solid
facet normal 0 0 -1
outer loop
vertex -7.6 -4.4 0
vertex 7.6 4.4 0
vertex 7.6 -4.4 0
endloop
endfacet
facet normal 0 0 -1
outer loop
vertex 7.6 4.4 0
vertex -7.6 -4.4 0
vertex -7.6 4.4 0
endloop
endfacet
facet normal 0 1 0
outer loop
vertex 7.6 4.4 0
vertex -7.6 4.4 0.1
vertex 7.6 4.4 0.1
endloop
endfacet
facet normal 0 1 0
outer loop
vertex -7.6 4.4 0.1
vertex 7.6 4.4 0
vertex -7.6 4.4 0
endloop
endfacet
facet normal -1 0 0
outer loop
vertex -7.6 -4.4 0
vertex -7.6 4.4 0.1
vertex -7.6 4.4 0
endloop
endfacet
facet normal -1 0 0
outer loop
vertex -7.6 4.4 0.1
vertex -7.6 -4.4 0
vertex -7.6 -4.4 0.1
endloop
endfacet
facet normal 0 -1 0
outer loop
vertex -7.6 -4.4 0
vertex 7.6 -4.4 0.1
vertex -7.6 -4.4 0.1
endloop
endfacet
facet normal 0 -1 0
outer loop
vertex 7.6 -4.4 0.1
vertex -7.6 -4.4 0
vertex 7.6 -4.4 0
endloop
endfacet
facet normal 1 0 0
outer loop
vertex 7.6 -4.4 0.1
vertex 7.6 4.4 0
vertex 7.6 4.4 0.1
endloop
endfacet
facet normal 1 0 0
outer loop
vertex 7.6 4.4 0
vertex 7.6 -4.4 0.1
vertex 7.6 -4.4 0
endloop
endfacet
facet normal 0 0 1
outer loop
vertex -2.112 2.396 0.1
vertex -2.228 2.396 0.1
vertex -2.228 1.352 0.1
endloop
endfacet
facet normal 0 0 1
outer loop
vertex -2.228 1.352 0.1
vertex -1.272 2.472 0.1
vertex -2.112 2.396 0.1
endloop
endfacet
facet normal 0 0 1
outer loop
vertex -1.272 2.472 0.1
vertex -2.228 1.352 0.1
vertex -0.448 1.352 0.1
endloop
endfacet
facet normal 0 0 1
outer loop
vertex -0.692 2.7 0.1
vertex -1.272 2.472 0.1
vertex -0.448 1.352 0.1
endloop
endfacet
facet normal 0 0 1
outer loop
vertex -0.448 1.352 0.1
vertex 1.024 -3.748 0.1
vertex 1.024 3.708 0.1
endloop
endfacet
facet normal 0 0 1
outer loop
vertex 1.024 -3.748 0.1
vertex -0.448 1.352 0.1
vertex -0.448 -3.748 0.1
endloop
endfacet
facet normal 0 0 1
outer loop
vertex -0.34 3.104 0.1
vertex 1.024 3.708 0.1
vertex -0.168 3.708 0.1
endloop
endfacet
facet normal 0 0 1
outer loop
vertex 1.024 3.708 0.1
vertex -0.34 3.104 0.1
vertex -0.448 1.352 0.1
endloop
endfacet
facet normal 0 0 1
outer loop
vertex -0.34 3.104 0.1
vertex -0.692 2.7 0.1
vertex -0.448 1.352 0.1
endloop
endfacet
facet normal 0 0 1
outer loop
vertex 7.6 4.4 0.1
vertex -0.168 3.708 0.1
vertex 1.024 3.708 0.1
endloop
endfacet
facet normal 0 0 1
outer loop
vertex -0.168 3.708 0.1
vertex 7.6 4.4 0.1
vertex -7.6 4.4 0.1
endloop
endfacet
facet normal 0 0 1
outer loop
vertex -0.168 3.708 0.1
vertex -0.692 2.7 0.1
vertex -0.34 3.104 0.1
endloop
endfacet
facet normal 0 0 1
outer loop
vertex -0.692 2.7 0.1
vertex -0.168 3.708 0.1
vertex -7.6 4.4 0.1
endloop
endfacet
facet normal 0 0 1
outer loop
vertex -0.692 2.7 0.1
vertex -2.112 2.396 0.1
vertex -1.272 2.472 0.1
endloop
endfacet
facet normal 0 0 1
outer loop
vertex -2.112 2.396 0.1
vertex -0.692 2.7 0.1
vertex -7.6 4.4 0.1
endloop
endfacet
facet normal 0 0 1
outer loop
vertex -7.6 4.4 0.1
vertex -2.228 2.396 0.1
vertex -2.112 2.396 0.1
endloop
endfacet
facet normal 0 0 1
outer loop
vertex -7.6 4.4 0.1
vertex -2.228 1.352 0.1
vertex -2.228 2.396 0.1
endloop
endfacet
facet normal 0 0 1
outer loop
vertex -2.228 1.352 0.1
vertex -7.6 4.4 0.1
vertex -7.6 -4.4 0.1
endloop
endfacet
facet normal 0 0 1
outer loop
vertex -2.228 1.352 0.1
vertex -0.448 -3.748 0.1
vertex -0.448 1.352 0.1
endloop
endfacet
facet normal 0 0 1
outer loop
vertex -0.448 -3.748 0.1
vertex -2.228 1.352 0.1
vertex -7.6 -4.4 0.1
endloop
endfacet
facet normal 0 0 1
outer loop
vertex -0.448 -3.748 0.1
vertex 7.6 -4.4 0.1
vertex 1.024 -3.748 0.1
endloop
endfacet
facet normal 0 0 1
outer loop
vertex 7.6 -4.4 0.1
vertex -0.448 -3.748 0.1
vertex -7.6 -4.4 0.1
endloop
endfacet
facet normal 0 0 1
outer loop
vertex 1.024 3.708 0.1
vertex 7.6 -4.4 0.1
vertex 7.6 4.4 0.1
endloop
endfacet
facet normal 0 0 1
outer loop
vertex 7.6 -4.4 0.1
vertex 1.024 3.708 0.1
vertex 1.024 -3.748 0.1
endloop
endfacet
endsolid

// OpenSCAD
// file: s/004452bs02.scad
use <../../lib.scad>
function ldraw_lib__s__004452bs02() = [
// 0 ~Sticker  1.1 x  1.9 with Number "1" - Background
// 0 Name: s\004452bs02.dat
// 0 Author: Takeshi Takahashi [RainbowDolphin]
// 0 !LDRAW_ORG Subpart UPDATE 2022-04
// 0 !LICENSE Licensed under CC BY 4.0 : see CAreadme.txt
// 
// 0 BFC CERTIFY CCW
  [0,"BFC","CERTIFY"],
  [0,"BFC","CCW"],
// 
// 0 !HISTORY 2022-07-18 [PTadmin] Official Update 2022-04
// 
// 
// 4 16 -19 -.25 11 -.42 -.25 9.27 2.56 -.25 9.27 19 -.25 11
  [4,16,-19,-.25,11,-.42,-.25,9.27,2.56,-.25,9.27,19,-.25,11],
// 4 16 -.85 -.25 7.76 -.42 -.25 9.27 -19 -.25 11 -1.73 -.25 6.75
  [4,16,-.85,-.25,7.76,-.42,-.25,9.27,-19,-.25,11,-1.73,-.25,6.75],
// 4 16 -3.18 -.25 6.18 -1.73 -.25 6.75 -19 -.25 11 -5.28 -.25 5.99
  [4,16,-3.18,-.25,6.18,-1.73,-.25,6.75,-19,-.25,11,-5.28,-.25,5.99],
// 3 16 -19 -.25 11 -5.57 -.25 5.99 -5.28 -.25 5.99
  [3,16,-19,-.25,11,-5.57,-.25,5.99,-5.28,-.25,5.99],
// 4 16 -5.57 -.25 3.38 -5.57 -.25 5.99 -19 -.25 11 -19 -.25 -11
  [4,16,-5.57,-.25,3.38,-5.57,-.25,5.99,-19,-.25,11,-19,-.25,-11],
// 4 16 -1.12 -.25 3.38 -5.57 -.25 3.38 -19 -.25 -11 -1.12 -.25 -9.37
  [4,16,-1.12,-.25,3.38,-5.57,-.25,3.38,-19,-.25,-11,-1.12,-.25,-9.37],
// 4 16 2.56 -.25 -9.37 -1.12 -.25 -9.37 -19 -.25 -11 19 -.25 -11
  [4,16,2.56,-.25,-9.37,-1.12,-.25,-9.37,-19,-.25,-11,19,-.25,-11],
// 4 16 2.56 -.25 9.27 2.56 -.25 -9.37 19 -.25 -11 19 -.25 11
  [4,16,2.56,-.25,9.27,2.56,-.25,-9.37,19,-.25,-11,19,-.25,11],
];
module ldraw_lib__s__004452bs02(step=0, col=false, unit=2/5, alt=false, line=0.2, solid=!$preview)
    makepoly(ldraw_lib__s__004452bs02(), step=step, col=col, unit=unit, alt=alt, line=line, solid=solid);
ldraw_lib__s__004452bs02(line=0.2);
// file: s/004452bs01.scad
use <../../lib.scad>
function ldraw_lib__s__004452bs01() = [
// 0 ~Sticker  1.1 x  1.9 with Number "1" - Type Face
// 0 Name: s\004452bs01.dat
// 0 Author: Takeshi Takahashi [RainbowDolphin]
// 0 !LDRAW_ORG Subpart UPDATE 2022-04
// 0 !LICENSE Licensed under CC BY 4.0 : see CAreadme.txt
// 
// 0 BFC CERTIFY CCW
  [0,"BFC","CERTIFY"],
  [0,"BFC","CCW"],
// 
// 0 !HISTORY 2022-07-18 [PTadmin] Official Update 2022-04
// 
// 
// 3 16 -5.28 -.25 5.99 -5.57 -.25 5.99 -5.57 -.25 3.38
  [3,16,-5.28,-.25,5.99,-5.57,-.25,5.99,-5.57,-.25,3.38],
// 4 16 -3.18 -.25 6.18 -5.28 -.25 5.99 -5.57 -.25 3.38 -1.12 -.25 3.38
  [4,16,-3.18,-.25,6.18,-5.28,-.25,5.99,-5.57,-.25,3.38,-1.12,-.25,3.38],
// 3 16 -1.73 -.25 6.75 -3.18 -.25 6.18 -1.12 -.25 3.38
  [3,16,-1.73,-.25,6.75,-3.18,-.25,6.18,-1.12,-.25,3.38],
// 4 16 -1.12 -.25 3.38 -1.12 -.25 -9.37 2.56 -.25 -9.37 2.56 -.25 9.27
  [4,16,-1.12,-.25,3.38,-1.12,-.25,-9.37,2.56,-.25,-9.37,2.56,-.25,9.27],
// 4 16 2.56 -.25 9.27 -.42 -.25 9.27 -.85 -.25 7.76 -1.12 -.25 3.38
  [4,16,2.56,-.25,9.27,-.42,-.25,9.27,-.85,-.25,7.76,-1.12,-.25,3.38],
// 3 16 -.85 -.25 7.76 -1.73 -.25 6.75 -1.12 -.25 3.38
  [3,16,-.85,-.25,7.76,-1.73,-.25,6.75,-1.12,-.25,3.38],
];
module ldraw_lib__s__004452bs01(step=0, col=false, unit=2/5, alt=false, line=0.2, solid=!$preview)
    makepoly(ldraw_lib__s__004452bs01(), step=step, col=col, unit=unit, alt=alt, line=line, solid=solid);
ldraw_lib__s__004452bs01(line=0.2);
// file: ../p/box5-12.scad
use <../lib.scad>
function ldraw_lib__box5_12() = [
// 0 Box with 5 Faces without Any Edges
// 0 Name: box5-12.dat
// 0 Author: Chris Dee [cwdee]
// 0 !LDRAW_ORG Primitive UPDATE 2009-02
// 0 !LICENSE Licensed under CC BY 4.0 : see CAreadme.txt
// 
// 0 BFC CERTIFY CCW
  [0,"BFC","CERTIFY"],
  [0,"BFC","CCW"],
// 
// 0 !HISTORY 2009-09-03 [PTadmin] Official Update 2009-02
// 
// 
// 4 16 1 1 1 1 1 -1 -1 1 -1 -1 1 1
  [4,16,1,1,1,1,1,-1,-1,1,-1,-1,1,1],
// 4 16 -1 0 1 1 0 1 1 1 1 -1 1 1
  [4,16,-1,0,1,1,0,1,1,1,1,-1,1,1],
// 4 16 -1 0 -1 -1 0 1 -1 1 1 -1 1 -1
  [4,16,-1,0,-1,-1,0,1,-1,1,1,-1,1,-1],
// 4 16 1 0 -1 -1 0 -1 -1 1 -1 1 1 -1
  [4,16,1,0,-1,-1,0,-1,-1,1,-1,1,1,-1],
// 4 16 1 0 1 1 0 -1 1 1 -1 1 1 1
  [4,16,1,0,1,1,0,-1,1,1,-1,1,1,1],
// 0
];
module ldraw_lib__box5_12(step=0, col=false, unit=2/5, alt=false, line=0.2, solid=!$preview)
    makepoly(ldraw_lib__box5_12(), step=step, col=col, unit=unit, alt=alt, line=line, solid=solid);
ldraw_lib__box5_12(line=0.2);
// main file
use <../lib.scad>
use <../p/box5-12.scad>
use <s/004452bs01.scad>
use <s/004452bs02.scad>
function ldraw_lib__004452b() = [
// 0 Sticker  1.1 x  1.9 with Black Number "1" on Yellow Background
// 0 Name: 004452b.dat
// 0 Author: Takeshi Takahashi [RainbowDolphin]
// 0 !LDRAW_ORG Part UPDATE 2022-04
// 0 !LICENSE Licensed under CC BY 4.0 : see CAreadme.txt
// 
// 0 BFC CERTIFY CCW
  [0,"BFC","CERTIFY"],
  [0,"BFC","CCW"],
// 
// 0 !KEYWORDS Fire Station, Set 374-1
// 
// 0 !HISTORY 2022-07-18 [PTadmin] Official Update 2022-04
// 
// 
// 1 16 0 -0.25 0 19 0 0 0 0.25 0 0 0 11 box5-12.dat
  [1,16,0,-0.25,0,19,0,0,0,0.25,0,0,0,11, ldraw_lib__box5_12()],
// 1 0 0 0 0 1 0 0 0 1 0 0 0 1 s\004452bs01.dat
  [1,0,0,0,0,1,0,0,0,1,0,0,0,1, ldraw_lib__s__004452bs01()],
// 1 14 0 0 0 1 0 0 0 1 0 0 0 1 s\004452bs02.dat
  [1,14,0,0,0,1,0,0,0,1,0,0,0,1, ldraw_lib__s__004452bs02()],
];
module ldraw_lib__004452b(step=0, col=false, unit=2/5, alt=false, line=0.2, solid=!$preview)
    makepoly(ldraw_lib__004452b(), step=step, col=col, unit=unit, alt=alt, line=line, solid=solid);
ldraw_lib__004452b(line=0.2);
